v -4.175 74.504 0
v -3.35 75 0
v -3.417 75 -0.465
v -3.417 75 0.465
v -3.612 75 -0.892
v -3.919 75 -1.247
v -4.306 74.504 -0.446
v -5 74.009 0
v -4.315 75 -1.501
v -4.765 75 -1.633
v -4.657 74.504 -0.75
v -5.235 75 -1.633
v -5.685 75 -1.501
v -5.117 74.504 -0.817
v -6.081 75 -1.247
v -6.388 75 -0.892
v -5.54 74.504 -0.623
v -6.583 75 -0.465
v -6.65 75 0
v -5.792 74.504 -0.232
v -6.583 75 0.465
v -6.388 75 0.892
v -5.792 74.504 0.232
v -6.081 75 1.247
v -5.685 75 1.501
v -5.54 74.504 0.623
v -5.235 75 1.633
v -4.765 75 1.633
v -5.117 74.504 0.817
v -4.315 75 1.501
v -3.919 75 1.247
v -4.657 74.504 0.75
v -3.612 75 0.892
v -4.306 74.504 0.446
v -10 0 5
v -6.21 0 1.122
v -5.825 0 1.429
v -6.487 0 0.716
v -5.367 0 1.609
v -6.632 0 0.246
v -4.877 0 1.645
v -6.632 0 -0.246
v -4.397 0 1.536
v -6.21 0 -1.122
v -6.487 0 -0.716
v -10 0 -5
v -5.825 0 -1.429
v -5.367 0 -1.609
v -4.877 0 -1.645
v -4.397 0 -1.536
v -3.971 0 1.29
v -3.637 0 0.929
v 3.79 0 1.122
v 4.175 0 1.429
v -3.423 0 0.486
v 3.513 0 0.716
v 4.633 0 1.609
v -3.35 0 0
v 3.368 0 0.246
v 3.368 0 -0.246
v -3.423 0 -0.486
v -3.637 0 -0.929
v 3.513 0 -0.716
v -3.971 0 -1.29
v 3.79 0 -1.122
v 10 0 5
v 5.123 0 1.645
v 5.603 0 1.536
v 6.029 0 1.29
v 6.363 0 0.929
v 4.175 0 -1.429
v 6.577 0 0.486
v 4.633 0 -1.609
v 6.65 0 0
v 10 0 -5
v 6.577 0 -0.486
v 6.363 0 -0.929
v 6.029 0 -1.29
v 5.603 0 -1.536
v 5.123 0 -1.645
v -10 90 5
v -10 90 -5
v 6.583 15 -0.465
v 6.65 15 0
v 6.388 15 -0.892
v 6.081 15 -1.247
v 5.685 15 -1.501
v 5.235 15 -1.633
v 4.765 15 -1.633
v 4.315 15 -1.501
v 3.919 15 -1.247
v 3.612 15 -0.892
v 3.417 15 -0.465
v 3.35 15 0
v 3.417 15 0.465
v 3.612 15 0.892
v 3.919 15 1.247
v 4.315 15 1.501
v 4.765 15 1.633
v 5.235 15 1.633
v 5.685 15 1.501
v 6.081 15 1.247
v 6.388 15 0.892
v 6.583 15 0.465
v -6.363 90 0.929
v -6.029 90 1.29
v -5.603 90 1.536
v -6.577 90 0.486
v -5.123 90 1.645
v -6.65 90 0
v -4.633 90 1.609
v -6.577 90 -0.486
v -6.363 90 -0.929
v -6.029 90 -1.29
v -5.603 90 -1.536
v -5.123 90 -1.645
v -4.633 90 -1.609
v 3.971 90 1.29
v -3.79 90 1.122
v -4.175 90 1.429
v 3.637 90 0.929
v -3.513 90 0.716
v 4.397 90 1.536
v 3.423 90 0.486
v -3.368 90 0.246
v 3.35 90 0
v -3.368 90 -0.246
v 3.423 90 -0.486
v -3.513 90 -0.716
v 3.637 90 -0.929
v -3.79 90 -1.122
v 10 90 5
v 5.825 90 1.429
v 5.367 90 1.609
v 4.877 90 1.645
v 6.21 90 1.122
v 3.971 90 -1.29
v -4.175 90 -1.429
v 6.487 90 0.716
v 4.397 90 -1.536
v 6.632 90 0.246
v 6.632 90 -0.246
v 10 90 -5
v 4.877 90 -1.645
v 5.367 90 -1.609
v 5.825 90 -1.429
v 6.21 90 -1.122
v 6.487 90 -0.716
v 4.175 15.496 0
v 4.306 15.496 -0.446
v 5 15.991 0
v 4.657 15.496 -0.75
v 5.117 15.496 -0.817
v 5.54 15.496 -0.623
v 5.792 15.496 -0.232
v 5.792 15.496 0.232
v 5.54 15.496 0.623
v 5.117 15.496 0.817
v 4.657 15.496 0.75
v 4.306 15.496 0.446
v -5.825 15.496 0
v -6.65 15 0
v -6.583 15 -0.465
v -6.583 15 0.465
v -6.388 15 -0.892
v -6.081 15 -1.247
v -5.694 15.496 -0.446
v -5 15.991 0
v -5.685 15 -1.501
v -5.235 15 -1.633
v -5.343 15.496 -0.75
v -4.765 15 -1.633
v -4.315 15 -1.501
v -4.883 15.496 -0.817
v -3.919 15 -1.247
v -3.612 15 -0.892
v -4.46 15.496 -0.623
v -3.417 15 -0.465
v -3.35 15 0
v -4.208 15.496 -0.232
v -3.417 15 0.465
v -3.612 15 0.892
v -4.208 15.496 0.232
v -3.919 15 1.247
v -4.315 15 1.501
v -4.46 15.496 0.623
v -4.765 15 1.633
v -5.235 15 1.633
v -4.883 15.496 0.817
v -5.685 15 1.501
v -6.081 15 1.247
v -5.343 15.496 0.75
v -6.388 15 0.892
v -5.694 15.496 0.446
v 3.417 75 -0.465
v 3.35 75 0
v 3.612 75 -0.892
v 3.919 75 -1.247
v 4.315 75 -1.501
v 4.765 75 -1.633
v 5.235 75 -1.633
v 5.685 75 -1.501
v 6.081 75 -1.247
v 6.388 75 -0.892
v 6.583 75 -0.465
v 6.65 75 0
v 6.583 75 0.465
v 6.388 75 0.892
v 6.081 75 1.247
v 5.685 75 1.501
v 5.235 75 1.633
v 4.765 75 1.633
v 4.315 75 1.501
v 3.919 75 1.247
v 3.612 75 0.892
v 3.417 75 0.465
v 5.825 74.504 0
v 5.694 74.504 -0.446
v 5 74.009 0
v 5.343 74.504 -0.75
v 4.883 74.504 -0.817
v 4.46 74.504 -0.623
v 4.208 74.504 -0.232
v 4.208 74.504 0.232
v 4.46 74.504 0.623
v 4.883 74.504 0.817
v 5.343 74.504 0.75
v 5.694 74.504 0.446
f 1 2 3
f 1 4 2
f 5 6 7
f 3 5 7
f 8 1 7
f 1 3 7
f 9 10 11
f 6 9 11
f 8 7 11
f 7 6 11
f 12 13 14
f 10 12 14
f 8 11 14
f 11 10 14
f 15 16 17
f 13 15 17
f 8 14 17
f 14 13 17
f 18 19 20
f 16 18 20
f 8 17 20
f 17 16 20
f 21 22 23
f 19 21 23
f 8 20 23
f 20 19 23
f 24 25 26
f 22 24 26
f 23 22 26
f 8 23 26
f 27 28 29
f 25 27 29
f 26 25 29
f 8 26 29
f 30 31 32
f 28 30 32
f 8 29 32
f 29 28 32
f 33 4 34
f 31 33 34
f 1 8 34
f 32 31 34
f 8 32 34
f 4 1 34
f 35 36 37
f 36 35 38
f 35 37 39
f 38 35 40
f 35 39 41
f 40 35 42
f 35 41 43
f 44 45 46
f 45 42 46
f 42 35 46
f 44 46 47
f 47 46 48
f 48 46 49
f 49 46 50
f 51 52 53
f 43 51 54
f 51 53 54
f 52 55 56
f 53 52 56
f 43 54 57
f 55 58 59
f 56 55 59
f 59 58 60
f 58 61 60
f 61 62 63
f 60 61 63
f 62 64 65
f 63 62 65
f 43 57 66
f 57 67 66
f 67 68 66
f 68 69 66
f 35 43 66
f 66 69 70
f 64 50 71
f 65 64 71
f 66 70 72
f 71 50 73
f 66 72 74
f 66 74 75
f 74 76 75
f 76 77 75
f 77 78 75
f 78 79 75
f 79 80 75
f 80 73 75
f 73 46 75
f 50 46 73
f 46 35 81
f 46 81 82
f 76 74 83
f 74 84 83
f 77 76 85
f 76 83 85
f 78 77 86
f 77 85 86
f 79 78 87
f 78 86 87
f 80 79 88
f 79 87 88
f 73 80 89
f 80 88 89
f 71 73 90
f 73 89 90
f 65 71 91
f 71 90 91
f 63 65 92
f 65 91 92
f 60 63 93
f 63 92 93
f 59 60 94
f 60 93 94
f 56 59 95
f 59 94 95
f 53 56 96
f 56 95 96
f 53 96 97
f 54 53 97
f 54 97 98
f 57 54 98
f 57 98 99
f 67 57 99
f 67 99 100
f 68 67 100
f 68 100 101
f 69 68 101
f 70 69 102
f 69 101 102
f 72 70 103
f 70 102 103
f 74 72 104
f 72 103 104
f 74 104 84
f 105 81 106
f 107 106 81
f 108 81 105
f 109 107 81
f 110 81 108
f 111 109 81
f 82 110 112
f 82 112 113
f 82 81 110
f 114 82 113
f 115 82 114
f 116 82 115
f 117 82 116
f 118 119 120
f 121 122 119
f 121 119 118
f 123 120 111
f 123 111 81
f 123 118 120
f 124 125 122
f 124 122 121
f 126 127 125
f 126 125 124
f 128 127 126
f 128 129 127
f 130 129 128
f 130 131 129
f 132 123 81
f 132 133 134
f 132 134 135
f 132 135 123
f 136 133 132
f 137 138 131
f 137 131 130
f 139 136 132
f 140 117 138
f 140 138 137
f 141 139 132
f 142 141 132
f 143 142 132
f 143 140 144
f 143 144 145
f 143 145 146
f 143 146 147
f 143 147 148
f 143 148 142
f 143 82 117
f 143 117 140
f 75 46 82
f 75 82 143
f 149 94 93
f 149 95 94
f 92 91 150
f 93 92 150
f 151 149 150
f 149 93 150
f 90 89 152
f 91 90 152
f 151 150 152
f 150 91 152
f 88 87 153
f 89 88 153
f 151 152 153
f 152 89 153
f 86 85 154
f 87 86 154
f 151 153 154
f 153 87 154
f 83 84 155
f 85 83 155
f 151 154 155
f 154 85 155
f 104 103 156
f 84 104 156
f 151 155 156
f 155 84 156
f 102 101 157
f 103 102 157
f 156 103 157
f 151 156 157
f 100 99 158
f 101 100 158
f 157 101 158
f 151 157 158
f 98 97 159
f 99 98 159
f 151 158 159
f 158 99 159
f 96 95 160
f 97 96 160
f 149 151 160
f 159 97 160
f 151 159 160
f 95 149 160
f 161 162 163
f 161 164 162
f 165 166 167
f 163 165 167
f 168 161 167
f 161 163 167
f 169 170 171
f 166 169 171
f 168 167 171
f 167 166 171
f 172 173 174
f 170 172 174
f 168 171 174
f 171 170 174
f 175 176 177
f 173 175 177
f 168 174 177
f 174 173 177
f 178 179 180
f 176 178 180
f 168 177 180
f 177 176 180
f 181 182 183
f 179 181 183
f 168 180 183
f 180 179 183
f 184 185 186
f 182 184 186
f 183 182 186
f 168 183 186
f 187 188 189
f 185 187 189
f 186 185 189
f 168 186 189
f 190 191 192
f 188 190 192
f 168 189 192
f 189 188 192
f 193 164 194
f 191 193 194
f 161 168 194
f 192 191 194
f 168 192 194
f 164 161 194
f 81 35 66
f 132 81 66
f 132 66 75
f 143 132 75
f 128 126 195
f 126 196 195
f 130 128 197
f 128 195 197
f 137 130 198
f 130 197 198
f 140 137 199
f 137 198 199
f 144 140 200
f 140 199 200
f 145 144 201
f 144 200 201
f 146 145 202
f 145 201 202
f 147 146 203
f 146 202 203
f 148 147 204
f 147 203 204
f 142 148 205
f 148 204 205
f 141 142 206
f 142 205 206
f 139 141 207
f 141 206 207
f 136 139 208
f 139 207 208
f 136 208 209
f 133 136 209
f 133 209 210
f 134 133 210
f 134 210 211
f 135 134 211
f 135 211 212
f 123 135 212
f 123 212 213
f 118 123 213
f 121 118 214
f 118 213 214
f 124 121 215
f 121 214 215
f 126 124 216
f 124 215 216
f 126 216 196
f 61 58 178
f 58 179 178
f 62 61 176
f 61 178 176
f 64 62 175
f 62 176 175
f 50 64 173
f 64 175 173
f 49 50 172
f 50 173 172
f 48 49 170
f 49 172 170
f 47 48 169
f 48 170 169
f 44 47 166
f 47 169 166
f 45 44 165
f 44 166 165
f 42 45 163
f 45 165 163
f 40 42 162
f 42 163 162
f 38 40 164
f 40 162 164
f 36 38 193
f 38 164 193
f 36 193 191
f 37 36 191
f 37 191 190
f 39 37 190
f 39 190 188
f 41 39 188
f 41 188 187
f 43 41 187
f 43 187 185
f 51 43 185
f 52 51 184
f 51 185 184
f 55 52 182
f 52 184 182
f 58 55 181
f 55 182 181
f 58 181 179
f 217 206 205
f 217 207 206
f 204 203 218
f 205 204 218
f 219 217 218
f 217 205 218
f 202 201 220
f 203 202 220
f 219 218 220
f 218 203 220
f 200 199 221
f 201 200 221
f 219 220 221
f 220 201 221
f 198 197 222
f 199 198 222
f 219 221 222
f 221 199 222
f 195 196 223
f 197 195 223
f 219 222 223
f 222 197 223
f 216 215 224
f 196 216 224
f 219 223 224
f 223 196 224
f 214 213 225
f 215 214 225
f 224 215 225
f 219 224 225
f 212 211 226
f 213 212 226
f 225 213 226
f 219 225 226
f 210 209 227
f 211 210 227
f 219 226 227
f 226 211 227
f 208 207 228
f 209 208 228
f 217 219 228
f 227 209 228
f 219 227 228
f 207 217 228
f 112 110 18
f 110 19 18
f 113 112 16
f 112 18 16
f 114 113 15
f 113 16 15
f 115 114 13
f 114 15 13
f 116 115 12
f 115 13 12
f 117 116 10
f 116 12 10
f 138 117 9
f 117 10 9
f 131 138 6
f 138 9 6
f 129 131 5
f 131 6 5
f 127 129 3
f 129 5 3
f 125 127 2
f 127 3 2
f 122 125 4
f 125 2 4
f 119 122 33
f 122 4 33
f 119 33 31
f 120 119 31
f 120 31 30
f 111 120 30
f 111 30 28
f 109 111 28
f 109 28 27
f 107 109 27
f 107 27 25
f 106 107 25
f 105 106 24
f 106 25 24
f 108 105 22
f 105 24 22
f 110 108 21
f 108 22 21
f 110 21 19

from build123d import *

# Parameters (mm, degrees)
SKETCH1_W                 = 20
SKETCH1_H                 = 10
BOSS_EXTRUDE1_DEPTH       = 90
M4X0_7_TAPPED_HOLE1_D     = 3.3
M4X0_7_TAPPED_HOLE1_DEPTH = 15
M4X0_7_TAPPED_HOLE1_TIP   = 0.991420021
M4X0_7_TAPPED_HOLE2_D     = 3.3
M4X0_7_TAPPED_HOLE2_DEPTH = 15
M4X0_7_TAPPED_HOLE2_TIP   = 0.991420021


with BuildPart() as part:
    # Sketch1 → Boss-Extrude1 (new body)
    with BuildSketch(Plane(origin=(0, 0, 0), x_dir=(1, 0, 0), z_dir=(0, 1, 0))):
        Rectangle(SKETCH1_W, SKETCH1_H)
    extrude(amount=BOSS_EXTRUDE1_DEPTH)

    # M4x0.7 Tapped Hole1
    with Locations(Plane(origin=(0, 0, 0), x_dir=(-1, 0, 0), z_dir=(0, -1, 0))):
        with Locations((-5, 0), (5, 0)):
            Hole(M4X0_7_TAPPED_HOLE1_D / 2, depth=M4X0_7_TAPPED_HOLE1_DEPTH)
            with Locations((0, 0, -(M4X0_7_TAPPED_HOLE1_DEPTH + M4X0_7_TAPPED_HOLE1_TIP / 2))):  # 118° drill point
                Cone(0, M4X0_7_TAPPED_HOLE1_D / 2, M4X0_7_TAPPED_HOLE1_TIP, mode=Mode.SUBTRACT)

    # M4x0.7 Tapped Hole2
    with Locations(Plane(origin=(0, 90, 0), x_dir=(1, 0, 0), z_dir=(0, 1, 0))):
        with Locations((-5, 0), (5, 0)):
            Hole(M4X0_7_TAPPED_HOLE2_D / 2, depth=M4X0_7_TAPPED_HOLE2_DEPTH)
            with Locations((0, 0, -(M4X0_7_TAPPED_HOLE2_DEPTH + M4X0_7_TAPPED_HOLE2_TIP / 2))):  # 118° drill point
                Cone(0, M4X0_7_TAPPED_HOLE2_D / 2, M4X0_7_TAPPED_HOLE2_TIP, mode=Mode.SUBTRACT)


solid = part.part
